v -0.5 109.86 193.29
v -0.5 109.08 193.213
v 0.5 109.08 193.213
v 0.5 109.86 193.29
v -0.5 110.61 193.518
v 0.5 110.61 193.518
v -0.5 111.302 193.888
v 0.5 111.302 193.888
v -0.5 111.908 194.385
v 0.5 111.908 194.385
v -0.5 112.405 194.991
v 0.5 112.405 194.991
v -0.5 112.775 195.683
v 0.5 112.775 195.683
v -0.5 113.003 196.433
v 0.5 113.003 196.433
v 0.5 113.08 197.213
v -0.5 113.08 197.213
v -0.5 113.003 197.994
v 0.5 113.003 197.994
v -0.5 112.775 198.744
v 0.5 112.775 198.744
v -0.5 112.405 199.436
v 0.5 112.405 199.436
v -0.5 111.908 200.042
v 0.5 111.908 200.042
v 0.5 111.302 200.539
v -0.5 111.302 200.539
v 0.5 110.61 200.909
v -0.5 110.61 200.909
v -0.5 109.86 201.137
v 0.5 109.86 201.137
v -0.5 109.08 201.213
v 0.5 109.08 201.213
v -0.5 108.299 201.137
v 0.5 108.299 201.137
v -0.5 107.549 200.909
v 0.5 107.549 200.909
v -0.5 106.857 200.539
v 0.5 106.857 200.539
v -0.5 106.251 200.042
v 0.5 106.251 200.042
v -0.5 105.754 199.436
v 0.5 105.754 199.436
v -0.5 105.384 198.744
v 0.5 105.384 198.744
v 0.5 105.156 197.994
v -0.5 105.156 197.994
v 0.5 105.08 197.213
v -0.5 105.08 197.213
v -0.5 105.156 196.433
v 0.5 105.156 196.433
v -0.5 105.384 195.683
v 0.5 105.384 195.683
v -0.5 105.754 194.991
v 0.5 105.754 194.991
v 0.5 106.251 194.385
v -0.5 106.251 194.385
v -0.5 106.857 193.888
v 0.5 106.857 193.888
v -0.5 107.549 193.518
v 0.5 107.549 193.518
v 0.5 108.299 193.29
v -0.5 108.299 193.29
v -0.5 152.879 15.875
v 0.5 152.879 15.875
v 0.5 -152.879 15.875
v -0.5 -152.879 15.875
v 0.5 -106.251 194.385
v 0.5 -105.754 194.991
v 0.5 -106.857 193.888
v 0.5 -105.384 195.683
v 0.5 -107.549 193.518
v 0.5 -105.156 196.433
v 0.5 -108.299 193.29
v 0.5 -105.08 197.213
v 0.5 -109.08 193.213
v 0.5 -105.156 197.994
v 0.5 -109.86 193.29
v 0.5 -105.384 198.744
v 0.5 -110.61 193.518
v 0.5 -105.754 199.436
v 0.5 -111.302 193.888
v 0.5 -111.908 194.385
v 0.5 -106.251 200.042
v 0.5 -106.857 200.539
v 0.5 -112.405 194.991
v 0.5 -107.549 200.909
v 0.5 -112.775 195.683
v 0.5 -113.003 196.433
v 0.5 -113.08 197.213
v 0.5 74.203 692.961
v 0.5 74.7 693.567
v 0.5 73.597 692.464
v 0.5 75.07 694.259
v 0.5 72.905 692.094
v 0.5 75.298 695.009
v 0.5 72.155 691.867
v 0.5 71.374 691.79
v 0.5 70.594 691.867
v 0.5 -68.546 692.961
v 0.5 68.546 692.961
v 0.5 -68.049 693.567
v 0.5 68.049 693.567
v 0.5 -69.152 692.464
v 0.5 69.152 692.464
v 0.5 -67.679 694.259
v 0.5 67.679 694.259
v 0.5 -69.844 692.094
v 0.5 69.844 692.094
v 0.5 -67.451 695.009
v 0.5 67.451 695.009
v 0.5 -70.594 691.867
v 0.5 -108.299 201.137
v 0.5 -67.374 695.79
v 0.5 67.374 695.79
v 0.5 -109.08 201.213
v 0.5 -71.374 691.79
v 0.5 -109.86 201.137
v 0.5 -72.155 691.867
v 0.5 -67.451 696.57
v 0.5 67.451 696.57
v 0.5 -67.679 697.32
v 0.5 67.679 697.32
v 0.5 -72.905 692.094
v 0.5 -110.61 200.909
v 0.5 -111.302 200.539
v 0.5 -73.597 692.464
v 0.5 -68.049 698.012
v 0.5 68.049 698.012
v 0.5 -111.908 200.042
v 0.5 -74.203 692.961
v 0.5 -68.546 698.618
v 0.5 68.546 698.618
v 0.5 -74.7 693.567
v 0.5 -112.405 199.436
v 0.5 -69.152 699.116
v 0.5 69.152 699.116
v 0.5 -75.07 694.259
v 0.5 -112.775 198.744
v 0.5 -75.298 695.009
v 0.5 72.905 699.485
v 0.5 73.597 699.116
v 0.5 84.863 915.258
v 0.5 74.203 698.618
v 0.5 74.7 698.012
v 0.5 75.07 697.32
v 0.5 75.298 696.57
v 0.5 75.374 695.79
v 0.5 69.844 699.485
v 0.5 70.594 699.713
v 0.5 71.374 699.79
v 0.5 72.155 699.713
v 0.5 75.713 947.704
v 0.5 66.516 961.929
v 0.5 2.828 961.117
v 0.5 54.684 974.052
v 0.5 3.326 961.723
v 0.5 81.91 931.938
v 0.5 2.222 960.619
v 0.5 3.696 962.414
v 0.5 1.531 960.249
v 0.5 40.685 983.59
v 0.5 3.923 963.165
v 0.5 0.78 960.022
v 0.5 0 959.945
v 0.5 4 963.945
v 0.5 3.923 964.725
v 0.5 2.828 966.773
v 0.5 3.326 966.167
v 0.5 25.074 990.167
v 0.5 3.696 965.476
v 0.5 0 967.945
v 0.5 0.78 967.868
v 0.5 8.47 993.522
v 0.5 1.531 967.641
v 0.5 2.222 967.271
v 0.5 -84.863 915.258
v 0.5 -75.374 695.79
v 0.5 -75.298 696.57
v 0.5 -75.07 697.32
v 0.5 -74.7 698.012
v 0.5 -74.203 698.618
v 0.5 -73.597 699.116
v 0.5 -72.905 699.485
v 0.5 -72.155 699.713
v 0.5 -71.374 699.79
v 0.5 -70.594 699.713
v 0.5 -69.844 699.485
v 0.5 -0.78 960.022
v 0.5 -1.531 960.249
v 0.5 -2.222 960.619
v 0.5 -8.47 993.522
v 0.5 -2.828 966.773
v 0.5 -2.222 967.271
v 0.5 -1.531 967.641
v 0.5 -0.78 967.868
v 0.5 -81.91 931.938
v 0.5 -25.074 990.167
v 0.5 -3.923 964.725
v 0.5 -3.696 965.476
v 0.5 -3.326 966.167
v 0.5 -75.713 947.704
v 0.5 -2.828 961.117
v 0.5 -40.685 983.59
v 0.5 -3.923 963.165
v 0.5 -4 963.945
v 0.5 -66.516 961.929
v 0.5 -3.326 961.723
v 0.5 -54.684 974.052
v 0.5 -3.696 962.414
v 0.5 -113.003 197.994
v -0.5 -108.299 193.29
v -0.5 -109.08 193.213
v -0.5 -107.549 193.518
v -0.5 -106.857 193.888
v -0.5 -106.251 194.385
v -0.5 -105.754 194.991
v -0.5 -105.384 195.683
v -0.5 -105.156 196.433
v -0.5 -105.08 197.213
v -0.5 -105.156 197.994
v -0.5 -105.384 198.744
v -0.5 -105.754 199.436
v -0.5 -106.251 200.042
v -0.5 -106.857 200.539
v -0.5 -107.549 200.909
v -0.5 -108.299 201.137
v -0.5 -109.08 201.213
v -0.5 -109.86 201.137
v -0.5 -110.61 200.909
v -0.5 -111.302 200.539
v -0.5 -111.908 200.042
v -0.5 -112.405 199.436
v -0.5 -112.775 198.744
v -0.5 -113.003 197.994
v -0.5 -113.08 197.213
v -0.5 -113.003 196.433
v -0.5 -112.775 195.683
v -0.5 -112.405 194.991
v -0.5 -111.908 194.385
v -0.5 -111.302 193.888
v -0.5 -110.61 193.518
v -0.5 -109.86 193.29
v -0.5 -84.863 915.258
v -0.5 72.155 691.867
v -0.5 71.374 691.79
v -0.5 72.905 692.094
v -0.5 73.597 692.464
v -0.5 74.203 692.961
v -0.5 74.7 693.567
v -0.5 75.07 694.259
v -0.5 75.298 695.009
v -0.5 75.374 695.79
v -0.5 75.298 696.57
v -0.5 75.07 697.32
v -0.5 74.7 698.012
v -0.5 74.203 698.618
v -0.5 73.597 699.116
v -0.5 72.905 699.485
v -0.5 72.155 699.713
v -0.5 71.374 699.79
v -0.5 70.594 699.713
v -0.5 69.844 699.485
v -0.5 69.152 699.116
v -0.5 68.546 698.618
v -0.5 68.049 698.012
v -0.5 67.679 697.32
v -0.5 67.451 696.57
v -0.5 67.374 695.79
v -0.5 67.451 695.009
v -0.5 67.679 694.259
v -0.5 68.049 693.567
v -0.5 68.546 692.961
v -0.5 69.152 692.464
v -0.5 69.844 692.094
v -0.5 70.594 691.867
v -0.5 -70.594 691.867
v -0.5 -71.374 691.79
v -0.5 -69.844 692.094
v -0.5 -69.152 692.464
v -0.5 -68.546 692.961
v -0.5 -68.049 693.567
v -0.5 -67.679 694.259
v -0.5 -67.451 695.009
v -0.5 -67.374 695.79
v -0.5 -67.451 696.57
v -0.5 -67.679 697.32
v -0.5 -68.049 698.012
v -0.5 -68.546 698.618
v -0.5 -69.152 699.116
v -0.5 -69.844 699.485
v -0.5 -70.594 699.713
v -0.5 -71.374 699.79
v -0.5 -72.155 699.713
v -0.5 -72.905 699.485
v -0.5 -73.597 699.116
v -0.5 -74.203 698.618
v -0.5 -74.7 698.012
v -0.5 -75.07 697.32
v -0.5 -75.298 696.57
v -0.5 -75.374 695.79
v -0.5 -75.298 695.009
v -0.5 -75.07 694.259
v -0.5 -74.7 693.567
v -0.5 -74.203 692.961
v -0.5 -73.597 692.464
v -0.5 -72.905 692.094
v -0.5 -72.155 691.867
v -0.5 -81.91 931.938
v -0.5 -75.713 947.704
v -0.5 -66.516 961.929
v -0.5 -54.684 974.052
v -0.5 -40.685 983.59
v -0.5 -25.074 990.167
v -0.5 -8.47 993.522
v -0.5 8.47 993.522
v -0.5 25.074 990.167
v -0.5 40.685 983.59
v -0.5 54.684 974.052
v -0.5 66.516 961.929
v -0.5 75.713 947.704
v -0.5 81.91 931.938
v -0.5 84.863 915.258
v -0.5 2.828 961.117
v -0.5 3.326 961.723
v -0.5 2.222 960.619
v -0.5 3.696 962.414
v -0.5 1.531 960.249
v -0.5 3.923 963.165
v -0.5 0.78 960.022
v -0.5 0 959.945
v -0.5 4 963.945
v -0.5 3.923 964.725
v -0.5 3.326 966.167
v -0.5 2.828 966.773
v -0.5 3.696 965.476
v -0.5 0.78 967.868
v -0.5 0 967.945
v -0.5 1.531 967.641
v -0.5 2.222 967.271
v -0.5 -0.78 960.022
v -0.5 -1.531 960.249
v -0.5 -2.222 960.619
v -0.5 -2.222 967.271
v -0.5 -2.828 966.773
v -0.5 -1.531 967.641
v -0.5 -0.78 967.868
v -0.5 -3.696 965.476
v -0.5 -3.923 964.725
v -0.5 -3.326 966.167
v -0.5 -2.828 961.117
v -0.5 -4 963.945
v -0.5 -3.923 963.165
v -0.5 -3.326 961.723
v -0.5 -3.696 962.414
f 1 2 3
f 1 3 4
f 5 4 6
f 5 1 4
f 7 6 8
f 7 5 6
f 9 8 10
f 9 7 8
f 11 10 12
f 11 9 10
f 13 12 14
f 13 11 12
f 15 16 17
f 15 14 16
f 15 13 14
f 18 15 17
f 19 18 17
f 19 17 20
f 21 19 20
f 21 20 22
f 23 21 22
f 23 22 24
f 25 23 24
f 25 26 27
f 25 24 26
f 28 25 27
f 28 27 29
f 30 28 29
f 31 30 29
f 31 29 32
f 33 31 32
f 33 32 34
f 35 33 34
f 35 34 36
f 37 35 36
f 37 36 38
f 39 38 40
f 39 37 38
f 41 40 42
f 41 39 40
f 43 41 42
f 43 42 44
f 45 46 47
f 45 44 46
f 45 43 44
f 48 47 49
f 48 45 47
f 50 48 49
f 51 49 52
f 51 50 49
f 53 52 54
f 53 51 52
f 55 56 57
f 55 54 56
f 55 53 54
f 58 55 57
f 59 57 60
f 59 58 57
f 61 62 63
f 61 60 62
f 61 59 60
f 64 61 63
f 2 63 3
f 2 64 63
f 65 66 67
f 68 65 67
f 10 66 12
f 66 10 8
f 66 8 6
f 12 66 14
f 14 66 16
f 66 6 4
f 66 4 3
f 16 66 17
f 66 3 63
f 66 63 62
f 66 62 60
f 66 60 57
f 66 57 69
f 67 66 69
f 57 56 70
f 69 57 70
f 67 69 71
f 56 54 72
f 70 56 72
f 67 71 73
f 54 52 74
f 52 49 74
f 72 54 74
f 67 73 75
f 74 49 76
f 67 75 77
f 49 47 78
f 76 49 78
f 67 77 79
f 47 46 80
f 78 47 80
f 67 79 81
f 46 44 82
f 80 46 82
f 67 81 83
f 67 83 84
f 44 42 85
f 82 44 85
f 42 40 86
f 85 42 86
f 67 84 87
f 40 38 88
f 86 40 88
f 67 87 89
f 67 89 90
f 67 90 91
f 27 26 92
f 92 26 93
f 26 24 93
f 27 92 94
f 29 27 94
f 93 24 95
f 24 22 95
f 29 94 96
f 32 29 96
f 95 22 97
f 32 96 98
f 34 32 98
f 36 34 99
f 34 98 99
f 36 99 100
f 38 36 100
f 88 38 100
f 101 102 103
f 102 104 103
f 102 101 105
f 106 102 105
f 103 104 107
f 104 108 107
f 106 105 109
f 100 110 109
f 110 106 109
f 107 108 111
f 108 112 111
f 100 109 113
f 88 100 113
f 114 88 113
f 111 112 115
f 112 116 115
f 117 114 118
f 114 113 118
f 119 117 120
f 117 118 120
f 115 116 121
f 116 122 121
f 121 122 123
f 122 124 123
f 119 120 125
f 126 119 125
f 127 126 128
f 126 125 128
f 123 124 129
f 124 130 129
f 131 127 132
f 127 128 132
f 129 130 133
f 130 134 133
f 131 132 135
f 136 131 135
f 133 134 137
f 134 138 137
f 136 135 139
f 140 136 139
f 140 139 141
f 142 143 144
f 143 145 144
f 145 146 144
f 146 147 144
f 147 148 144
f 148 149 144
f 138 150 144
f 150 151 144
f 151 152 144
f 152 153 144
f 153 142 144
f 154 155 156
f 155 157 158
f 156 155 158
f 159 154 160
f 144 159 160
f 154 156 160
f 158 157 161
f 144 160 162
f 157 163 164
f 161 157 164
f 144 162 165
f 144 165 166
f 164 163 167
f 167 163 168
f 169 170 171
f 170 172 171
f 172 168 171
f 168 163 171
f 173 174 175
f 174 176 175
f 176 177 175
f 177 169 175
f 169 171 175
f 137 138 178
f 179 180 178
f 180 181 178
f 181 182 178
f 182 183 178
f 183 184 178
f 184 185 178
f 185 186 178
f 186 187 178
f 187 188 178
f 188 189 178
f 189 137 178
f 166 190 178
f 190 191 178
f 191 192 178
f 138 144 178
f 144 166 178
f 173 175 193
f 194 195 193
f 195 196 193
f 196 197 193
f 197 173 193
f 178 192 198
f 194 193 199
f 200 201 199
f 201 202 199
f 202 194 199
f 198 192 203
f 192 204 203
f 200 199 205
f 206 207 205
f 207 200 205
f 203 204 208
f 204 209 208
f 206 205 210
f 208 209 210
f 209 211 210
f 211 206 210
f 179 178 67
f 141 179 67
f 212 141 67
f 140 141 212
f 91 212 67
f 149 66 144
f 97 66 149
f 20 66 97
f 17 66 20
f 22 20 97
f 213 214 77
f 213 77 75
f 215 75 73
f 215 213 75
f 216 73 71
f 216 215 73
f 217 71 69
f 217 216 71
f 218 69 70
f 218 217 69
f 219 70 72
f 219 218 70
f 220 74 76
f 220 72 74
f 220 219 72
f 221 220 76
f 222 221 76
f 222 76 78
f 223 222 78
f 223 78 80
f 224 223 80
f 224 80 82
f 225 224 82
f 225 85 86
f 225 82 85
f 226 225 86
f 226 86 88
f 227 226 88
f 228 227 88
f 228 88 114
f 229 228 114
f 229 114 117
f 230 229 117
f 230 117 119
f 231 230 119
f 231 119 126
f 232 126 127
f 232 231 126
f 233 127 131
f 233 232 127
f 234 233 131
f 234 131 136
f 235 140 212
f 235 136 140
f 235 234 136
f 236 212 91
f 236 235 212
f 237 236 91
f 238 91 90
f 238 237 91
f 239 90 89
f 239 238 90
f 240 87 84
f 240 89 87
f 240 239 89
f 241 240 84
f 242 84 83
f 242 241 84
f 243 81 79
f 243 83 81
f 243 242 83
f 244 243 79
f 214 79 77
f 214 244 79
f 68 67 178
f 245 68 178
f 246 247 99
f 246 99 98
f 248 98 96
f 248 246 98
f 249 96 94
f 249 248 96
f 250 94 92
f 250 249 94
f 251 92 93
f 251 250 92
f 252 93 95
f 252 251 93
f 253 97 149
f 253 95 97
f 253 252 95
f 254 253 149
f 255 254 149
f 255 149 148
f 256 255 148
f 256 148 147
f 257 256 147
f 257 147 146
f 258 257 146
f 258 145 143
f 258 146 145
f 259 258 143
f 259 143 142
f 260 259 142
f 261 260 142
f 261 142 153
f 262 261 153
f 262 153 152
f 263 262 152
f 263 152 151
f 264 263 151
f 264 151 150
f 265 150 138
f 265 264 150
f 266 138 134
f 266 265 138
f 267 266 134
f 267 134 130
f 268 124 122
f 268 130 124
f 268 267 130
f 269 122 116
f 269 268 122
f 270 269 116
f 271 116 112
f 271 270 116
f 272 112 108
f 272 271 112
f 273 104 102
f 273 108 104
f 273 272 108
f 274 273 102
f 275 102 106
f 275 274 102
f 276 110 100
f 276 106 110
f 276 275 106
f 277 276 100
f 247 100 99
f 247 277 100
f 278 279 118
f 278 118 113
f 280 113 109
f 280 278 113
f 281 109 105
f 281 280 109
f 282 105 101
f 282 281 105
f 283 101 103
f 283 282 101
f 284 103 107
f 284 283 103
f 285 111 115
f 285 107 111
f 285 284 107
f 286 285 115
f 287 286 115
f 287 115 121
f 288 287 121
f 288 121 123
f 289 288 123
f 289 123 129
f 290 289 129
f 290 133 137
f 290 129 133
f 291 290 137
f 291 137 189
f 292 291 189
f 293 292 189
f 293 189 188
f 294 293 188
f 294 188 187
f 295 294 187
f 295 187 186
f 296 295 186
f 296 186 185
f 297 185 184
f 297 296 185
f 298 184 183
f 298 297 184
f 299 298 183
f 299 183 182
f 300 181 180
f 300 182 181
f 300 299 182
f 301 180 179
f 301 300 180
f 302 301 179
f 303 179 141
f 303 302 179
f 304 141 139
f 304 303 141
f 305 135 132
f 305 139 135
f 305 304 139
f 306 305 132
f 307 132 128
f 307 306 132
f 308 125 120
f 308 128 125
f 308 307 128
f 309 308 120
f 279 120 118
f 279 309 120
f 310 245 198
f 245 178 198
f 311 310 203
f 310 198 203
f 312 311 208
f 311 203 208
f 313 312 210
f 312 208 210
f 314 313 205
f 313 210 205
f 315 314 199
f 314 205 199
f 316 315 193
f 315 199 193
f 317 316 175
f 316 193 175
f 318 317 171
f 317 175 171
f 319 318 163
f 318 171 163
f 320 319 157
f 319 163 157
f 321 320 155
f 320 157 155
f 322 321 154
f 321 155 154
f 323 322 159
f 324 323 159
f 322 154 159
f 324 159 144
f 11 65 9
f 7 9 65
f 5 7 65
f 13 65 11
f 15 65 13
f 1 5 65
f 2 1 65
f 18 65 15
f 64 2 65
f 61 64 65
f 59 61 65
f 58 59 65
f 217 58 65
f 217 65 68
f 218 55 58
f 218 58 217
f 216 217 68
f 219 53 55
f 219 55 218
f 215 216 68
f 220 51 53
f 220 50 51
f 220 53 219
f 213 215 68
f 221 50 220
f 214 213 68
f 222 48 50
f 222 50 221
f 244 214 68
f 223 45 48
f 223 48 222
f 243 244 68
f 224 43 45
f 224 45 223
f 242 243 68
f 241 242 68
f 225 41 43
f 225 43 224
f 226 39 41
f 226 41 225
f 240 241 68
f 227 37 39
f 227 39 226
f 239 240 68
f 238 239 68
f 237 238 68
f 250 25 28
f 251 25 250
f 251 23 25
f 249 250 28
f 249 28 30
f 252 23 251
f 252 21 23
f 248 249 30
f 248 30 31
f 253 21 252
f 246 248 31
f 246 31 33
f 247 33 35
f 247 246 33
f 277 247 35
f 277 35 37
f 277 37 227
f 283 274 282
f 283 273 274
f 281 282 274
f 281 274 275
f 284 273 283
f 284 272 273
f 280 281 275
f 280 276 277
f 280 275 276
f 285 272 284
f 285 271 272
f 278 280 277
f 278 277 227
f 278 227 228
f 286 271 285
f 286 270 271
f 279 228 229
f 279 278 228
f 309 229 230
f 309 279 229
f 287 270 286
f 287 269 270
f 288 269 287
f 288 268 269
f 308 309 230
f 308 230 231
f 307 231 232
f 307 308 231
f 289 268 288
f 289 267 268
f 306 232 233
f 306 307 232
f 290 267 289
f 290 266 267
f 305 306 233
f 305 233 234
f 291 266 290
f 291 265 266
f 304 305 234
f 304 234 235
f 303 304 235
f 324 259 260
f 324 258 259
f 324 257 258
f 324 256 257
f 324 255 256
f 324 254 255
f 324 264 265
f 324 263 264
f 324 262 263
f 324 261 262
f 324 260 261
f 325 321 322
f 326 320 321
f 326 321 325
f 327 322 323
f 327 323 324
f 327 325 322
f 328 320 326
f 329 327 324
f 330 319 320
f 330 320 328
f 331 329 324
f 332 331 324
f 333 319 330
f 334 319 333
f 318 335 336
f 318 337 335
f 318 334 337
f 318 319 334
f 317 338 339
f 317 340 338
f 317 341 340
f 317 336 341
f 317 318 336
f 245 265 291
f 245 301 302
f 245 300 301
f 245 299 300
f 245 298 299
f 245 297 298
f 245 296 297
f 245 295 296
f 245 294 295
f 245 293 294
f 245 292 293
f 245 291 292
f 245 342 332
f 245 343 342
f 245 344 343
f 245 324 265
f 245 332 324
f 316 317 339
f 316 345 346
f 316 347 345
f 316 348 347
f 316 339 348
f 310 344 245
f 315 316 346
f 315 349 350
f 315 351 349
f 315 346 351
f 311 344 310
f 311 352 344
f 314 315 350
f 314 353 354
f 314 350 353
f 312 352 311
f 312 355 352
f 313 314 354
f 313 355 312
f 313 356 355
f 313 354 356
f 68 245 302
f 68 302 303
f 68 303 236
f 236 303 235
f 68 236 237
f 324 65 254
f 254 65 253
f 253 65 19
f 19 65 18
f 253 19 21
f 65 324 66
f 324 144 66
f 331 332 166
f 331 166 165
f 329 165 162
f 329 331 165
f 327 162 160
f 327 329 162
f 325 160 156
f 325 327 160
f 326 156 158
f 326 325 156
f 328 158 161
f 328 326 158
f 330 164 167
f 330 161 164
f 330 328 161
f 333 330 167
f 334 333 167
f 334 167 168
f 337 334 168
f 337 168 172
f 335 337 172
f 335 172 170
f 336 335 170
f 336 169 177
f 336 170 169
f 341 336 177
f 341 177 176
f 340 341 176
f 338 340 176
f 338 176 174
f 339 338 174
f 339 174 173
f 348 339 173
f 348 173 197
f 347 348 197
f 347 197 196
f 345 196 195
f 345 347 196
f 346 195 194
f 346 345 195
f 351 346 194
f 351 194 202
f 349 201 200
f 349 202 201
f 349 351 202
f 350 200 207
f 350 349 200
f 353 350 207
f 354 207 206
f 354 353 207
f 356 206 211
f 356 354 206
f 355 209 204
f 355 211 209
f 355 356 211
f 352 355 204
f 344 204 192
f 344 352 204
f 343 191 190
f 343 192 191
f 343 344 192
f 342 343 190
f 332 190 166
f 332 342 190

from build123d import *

# Parameters (mm, degrees)
BOSS_EXTRUDE1_DEPTH     = 0.5
CUT_EXTRUDE1_DEPTH      = 1006.633971904
CUT_EXTRUDE1_DEPTH_BACK = 1006.633971904
SKETCH2_R               = 4


with BuildPart() as part:
    # Sketch1 → Boss-Extrude1 (new, symmetric)
    with BuildSketch(Plane.YZ):
        with BuildLine():
            Line((-152.879110482, 15.875), (-84.862670824, 915.257797566))
            ThreePointArc((-84.862670824, 915.257797566), (0, 993.945), (84.862670824, 915.257797566))
            Line((84.862670824, 915.257797566), (152.879110482, 15.875))
            Line((152.879110482, 15.875), (-152.879110482, 15.875))
        make_face()
    extrude(amount=BOSS_EXTRUDE1_DEPTH, both=True)

    # Sketch2 → Cut-Extrude1 (cut, two sides: drawn at the far end of the back side and taken through both)
    with BuildSketch(Plane.YZ.offset(0.5).offset(-CUT_EXTRUDE1_DEPTH_BACK)):
        with Locations(Location((71.374429386, 695.789702433, 0), (0, 0, 270))):
            Circle(SKETCH2_R)
        with Locations(Location((109.079602796, 197.213409477, 0), (0, 0, 270))):
            Circle(SKETCH2_R)
        with Locations(Location((0, 963.945, 0), (0, 0, 270))):
            Circle(SKETCH2_R)
        with Locations(Location((-71.374429386, 695.789702433, 0), (0, 0, 270))):
            Circle(SKETCH2_R)
        with Locations(Location((-109.079602796, 197.213409477, 0), (0, 0, 270))):
            Circle(SKETCH2_R)
    extrude(amount=CUT_EXTRUDE1_DEPTH + CUT_EXTRUDE1_DEPTH_BACK, mode=Mode.SUBTRACT)


solid = part.part
